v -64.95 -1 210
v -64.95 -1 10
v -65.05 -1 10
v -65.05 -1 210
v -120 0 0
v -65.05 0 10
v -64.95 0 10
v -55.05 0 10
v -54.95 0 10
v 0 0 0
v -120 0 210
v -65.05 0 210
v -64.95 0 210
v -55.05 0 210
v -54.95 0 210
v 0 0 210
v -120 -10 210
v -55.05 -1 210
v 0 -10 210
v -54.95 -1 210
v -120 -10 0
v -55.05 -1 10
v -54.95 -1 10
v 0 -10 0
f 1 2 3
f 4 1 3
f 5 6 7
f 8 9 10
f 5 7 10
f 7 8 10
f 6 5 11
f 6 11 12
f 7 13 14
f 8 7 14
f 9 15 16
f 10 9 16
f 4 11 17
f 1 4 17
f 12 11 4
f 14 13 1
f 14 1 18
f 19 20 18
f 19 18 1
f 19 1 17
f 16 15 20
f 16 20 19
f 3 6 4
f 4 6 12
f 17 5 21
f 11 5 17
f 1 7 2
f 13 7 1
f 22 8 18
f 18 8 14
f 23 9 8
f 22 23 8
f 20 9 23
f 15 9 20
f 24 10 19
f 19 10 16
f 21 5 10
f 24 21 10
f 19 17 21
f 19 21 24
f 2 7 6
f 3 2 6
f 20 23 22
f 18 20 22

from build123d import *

# Parameters (mm, degrees)
F0_W     = 120
F0_H     = 210
F1_DEPTH = 10
F2_W     = 0.1
F2_H     = 200
F3_DEPTH = 1


with BuildPart() as f1:
    # F0 (on Front) → F1 (new body)
    with BuildSketch(Plane.XZ):
        with Locations((-60, 105)):
            Rectangle(F0_W, F0_H)
    extrude(amount=F1_DEPTH)

    # F2 (on face) → F3 (cut)
    with BuildSketch(Plane(origin=(0, 0, 0), x_dir=(-1, 0, 0), z_dir=(0, 1, 0))):
        with Locations((55, 110)):
            Rectangle(F2_W, F2_H)
        with Locations((65, 110)):
            Rectangle(F2_W, F2_H)
    extrude(amount=-F3_DEPTH, mode=Mode.SUBTRACT)


solid = f1.part
